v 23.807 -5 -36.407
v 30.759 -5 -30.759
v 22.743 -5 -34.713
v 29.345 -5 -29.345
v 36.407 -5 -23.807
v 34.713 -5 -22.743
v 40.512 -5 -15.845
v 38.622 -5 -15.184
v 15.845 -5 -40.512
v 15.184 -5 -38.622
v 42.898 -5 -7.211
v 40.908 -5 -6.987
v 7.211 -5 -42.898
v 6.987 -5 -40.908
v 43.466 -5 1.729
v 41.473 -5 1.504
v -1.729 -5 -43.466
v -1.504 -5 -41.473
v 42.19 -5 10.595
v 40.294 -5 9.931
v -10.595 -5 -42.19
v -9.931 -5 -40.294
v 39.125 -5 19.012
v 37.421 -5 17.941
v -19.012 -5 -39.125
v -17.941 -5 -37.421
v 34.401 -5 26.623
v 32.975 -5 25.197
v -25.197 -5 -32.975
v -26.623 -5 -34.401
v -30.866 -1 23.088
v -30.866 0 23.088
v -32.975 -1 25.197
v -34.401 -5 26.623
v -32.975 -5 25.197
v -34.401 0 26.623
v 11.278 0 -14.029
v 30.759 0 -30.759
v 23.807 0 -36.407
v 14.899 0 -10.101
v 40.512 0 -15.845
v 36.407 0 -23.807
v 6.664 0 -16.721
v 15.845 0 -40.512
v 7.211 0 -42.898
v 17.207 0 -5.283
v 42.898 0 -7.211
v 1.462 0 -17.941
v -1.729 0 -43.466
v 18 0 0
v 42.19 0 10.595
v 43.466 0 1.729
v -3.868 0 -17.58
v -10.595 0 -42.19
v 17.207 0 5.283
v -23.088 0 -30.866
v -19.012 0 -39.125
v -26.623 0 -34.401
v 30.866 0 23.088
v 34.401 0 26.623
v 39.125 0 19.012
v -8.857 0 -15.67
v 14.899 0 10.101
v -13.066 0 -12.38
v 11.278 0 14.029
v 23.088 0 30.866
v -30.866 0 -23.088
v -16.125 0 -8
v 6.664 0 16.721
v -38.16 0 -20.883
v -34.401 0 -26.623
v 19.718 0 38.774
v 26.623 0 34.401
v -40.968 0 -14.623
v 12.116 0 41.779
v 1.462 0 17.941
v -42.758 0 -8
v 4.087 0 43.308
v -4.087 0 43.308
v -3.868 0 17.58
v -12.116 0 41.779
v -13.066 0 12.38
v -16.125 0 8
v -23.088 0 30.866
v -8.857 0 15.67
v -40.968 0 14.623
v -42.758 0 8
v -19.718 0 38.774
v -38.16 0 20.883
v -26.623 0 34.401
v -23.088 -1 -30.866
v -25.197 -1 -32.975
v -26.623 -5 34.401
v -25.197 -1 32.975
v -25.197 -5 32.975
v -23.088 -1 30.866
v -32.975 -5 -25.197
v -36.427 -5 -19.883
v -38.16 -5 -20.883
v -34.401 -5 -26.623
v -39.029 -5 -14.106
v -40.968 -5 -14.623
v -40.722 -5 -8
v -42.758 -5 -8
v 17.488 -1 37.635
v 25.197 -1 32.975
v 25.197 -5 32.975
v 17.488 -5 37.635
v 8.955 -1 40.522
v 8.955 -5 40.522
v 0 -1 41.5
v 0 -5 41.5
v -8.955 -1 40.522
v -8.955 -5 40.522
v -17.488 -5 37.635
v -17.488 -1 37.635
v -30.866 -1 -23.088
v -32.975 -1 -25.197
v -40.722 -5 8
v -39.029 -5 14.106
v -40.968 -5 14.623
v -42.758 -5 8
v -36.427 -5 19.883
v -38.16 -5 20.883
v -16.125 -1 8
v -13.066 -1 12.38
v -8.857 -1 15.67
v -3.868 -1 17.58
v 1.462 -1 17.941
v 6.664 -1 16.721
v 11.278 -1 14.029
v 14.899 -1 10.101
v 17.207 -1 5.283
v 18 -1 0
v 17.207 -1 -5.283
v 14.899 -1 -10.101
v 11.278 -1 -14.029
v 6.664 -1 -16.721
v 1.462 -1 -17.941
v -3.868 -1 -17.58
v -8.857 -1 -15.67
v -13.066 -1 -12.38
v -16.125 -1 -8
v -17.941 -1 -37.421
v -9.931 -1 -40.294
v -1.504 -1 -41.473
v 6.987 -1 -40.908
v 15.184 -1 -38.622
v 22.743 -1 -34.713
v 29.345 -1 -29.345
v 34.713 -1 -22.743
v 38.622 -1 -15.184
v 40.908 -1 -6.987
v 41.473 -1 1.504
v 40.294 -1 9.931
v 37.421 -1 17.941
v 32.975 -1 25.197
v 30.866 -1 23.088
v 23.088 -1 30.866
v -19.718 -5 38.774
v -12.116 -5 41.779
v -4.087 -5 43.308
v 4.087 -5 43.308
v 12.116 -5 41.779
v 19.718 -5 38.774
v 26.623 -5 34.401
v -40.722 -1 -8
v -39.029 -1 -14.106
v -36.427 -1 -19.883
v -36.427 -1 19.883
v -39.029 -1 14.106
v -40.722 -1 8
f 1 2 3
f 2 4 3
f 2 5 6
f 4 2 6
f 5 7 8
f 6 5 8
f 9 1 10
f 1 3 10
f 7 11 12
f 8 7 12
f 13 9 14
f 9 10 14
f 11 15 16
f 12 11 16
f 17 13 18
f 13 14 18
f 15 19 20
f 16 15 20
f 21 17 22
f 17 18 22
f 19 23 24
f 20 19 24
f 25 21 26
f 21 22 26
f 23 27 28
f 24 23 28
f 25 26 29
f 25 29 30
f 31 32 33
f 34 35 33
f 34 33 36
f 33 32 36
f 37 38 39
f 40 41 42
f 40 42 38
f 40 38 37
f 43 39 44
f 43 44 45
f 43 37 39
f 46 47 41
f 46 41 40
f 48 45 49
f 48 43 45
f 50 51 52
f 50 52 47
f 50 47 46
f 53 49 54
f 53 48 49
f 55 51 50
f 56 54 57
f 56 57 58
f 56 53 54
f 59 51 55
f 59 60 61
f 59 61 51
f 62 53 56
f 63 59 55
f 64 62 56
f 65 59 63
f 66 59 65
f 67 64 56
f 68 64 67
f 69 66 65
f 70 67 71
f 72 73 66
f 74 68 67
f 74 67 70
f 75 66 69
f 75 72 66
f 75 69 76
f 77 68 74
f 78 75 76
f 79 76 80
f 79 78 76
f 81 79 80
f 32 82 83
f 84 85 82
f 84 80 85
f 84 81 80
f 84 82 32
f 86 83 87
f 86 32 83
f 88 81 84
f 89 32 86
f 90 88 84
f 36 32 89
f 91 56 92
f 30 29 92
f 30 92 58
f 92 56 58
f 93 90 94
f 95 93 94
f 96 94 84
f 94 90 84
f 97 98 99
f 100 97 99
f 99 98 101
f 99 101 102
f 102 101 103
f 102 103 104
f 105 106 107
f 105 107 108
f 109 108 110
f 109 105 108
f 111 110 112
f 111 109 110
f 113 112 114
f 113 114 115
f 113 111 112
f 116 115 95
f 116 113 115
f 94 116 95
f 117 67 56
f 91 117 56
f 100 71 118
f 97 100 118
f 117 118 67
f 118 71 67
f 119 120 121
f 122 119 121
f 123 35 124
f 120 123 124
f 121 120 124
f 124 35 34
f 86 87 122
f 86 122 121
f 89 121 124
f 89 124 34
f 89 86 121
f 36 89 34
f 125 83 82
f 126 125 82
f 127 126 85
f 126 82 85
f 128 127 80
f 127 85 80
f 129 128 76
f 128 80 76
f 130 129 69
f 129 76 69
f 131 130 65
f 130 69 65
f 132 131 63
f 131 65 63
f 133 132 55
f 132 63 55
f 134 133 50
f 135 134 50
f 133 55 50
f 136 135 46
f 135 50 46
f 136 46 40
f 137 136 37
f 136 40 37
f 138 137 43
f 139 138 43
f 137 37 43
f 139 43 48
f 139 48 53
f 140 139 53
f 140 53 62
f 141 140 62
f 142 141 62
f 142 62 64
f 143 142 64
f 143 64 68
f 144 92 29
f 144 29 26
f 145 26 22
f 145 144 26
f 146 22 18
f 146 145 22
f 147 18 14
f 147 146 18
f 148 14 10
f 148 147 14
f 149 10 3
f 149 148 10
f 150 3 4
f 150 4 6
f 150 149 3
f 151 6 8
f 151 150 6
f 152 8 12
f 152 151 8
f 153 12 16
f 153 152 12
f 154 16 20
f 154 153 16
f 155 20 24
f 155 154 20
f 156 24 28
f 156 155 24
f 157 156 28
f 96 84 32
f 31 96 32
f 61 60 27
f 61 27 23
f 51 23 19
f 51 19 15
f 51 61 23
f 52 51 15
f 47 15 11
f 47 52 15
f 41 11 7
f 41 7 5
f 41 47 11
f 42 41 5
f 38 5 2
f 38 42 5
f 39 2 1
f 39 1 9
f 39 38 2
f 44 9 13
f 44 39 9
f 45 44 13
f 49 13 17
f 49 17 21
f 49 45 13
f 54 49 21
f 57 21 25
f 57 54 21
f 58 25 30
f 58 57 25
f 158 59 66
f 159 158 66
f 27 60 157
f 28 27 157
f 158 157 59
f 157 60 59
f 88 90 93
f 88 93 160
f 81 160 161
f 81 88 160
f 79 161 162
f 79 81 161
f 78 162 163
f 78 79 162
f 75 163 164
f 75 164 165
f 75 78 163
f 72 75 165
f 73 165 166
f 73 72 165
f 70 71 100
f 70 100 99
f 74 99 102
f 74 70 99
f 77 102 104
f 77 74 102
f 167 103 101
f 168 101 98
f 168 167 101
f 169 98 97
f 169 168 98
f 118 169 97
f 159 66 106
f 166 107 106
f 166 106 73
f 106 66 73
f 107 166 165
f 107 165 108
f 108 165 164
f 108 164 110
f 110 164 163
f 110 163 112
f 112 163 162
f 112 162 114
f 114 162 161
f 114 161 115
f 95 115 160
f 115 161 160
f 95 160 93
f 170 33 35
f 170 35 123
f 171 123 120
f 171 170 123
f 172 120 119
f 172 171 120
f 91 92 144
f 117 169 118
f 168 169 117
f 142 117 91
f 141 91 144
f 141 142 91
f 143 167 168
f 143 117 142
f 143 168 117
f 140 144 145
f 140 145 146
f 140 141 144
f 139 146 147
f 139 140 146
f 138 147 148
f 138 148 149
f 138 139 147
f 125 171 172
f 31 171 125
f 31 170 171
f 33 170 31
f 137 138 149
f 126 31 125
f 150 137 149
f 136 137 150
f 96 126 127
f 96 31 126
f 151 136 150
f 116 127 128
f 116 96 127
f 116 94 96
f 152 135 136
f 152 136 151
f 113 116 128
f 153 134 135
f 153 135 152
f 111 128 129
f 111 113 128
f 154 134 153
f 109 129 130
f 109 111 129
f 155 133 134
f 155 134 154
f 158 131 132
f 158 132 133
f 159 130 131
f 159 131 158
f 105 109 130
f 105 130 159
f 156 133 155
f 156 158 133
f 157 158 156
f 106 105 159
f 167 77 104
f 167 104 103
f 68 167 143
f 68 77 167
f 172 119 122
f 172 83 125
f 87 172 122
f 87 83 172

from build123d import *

# Parameters (mm, degrees)
F1_DEPTH = 1
F3_DEPTH = 5
F5_DEPTH = 5


with BuildPart() as f1:
    # F0 (on Front) → F1 (new body)
    with BuildSketch(Plane.XZ):
        with BuildLine():
            Line((-16.124515, -8), (-40.721616, -8))
            ThreePointArc((-40.721616, -8), (41.5, 0), (-40.721616, 8))
            Line((-40.721616, 8), (-16.124515, 8))
            ThreePointArc((-16.124515, 8), (18, 0), (-16.124515, -8))
        make_face()
    extrude(amount=F1_DEPTH)

    # F2 (on face) → F3 (join)
    with BuildSketch(Plane(origin=(0, 0, 0), x_dir=(-1, 0, 0), z_dir=(0, 1, 0))):
        with BuildLine():
            Line((40.721616, 8), (42.75804, 8))
            ThreePointArc((42.75804, 8), (-43.5, 0), (42.75804, -8))
            Line((42.75804, -8), (40.721616, -8))
            ThreePointArc((40.721616, -8), (-41.5, 0), (40.721616, 8))
        make_face()
    extrude(amount=-F3_DEPTH)

    # F4 (on face) → F5 (cut, through all)
    with BuildSketch(Plane(origin=(0, 0, 0), x_dir=(-1, 0, 0), z_dir=(0, 1, 0))):
        with BuildLine():
            Line((30.865846, -23.087671), (23.087671, -30.865846))
            Line((23.087671, -30.865846), (26.623205, -34.40138))
            ThreePointArc((26.623205, -34.40138), (30.759145, -30.759145), (34.40138, -26.623205))
            Line((34.40138, -26.623205), (30.865846, -23.087671))
        make_face()
        with BuildLine():
            Line((26.623205, 34.40138), (23.087671, 30.865846))
            Line((23.087671, 30.865846), (30.865846, 23.087671))
            Line((30.865846, 23.087671), (34.40138, 26.623205))
            ThreePointArc((34.40138, 26.623205), (30.759145, 30.759145), (26.623205, 34.40138))
        make_face()
        with BuildLine():
            Line((-34.40138, 26.623205), (-30.865846, 23.087671))
            Line((-30.865846, 23.087671), (-23.087671, 30.865846))
            Line((-23.087671, 30.865846), (-26.623205, 34.40138))
            ThreePointArc((-26.623205, 34.40138), (-30.759145, 30.759145), (-34.40138, 26.623205))
        make_face()
    extrude(amount=-F5_DEPTH, mode=Mode.SUBTRACT)


solid = f1.part
